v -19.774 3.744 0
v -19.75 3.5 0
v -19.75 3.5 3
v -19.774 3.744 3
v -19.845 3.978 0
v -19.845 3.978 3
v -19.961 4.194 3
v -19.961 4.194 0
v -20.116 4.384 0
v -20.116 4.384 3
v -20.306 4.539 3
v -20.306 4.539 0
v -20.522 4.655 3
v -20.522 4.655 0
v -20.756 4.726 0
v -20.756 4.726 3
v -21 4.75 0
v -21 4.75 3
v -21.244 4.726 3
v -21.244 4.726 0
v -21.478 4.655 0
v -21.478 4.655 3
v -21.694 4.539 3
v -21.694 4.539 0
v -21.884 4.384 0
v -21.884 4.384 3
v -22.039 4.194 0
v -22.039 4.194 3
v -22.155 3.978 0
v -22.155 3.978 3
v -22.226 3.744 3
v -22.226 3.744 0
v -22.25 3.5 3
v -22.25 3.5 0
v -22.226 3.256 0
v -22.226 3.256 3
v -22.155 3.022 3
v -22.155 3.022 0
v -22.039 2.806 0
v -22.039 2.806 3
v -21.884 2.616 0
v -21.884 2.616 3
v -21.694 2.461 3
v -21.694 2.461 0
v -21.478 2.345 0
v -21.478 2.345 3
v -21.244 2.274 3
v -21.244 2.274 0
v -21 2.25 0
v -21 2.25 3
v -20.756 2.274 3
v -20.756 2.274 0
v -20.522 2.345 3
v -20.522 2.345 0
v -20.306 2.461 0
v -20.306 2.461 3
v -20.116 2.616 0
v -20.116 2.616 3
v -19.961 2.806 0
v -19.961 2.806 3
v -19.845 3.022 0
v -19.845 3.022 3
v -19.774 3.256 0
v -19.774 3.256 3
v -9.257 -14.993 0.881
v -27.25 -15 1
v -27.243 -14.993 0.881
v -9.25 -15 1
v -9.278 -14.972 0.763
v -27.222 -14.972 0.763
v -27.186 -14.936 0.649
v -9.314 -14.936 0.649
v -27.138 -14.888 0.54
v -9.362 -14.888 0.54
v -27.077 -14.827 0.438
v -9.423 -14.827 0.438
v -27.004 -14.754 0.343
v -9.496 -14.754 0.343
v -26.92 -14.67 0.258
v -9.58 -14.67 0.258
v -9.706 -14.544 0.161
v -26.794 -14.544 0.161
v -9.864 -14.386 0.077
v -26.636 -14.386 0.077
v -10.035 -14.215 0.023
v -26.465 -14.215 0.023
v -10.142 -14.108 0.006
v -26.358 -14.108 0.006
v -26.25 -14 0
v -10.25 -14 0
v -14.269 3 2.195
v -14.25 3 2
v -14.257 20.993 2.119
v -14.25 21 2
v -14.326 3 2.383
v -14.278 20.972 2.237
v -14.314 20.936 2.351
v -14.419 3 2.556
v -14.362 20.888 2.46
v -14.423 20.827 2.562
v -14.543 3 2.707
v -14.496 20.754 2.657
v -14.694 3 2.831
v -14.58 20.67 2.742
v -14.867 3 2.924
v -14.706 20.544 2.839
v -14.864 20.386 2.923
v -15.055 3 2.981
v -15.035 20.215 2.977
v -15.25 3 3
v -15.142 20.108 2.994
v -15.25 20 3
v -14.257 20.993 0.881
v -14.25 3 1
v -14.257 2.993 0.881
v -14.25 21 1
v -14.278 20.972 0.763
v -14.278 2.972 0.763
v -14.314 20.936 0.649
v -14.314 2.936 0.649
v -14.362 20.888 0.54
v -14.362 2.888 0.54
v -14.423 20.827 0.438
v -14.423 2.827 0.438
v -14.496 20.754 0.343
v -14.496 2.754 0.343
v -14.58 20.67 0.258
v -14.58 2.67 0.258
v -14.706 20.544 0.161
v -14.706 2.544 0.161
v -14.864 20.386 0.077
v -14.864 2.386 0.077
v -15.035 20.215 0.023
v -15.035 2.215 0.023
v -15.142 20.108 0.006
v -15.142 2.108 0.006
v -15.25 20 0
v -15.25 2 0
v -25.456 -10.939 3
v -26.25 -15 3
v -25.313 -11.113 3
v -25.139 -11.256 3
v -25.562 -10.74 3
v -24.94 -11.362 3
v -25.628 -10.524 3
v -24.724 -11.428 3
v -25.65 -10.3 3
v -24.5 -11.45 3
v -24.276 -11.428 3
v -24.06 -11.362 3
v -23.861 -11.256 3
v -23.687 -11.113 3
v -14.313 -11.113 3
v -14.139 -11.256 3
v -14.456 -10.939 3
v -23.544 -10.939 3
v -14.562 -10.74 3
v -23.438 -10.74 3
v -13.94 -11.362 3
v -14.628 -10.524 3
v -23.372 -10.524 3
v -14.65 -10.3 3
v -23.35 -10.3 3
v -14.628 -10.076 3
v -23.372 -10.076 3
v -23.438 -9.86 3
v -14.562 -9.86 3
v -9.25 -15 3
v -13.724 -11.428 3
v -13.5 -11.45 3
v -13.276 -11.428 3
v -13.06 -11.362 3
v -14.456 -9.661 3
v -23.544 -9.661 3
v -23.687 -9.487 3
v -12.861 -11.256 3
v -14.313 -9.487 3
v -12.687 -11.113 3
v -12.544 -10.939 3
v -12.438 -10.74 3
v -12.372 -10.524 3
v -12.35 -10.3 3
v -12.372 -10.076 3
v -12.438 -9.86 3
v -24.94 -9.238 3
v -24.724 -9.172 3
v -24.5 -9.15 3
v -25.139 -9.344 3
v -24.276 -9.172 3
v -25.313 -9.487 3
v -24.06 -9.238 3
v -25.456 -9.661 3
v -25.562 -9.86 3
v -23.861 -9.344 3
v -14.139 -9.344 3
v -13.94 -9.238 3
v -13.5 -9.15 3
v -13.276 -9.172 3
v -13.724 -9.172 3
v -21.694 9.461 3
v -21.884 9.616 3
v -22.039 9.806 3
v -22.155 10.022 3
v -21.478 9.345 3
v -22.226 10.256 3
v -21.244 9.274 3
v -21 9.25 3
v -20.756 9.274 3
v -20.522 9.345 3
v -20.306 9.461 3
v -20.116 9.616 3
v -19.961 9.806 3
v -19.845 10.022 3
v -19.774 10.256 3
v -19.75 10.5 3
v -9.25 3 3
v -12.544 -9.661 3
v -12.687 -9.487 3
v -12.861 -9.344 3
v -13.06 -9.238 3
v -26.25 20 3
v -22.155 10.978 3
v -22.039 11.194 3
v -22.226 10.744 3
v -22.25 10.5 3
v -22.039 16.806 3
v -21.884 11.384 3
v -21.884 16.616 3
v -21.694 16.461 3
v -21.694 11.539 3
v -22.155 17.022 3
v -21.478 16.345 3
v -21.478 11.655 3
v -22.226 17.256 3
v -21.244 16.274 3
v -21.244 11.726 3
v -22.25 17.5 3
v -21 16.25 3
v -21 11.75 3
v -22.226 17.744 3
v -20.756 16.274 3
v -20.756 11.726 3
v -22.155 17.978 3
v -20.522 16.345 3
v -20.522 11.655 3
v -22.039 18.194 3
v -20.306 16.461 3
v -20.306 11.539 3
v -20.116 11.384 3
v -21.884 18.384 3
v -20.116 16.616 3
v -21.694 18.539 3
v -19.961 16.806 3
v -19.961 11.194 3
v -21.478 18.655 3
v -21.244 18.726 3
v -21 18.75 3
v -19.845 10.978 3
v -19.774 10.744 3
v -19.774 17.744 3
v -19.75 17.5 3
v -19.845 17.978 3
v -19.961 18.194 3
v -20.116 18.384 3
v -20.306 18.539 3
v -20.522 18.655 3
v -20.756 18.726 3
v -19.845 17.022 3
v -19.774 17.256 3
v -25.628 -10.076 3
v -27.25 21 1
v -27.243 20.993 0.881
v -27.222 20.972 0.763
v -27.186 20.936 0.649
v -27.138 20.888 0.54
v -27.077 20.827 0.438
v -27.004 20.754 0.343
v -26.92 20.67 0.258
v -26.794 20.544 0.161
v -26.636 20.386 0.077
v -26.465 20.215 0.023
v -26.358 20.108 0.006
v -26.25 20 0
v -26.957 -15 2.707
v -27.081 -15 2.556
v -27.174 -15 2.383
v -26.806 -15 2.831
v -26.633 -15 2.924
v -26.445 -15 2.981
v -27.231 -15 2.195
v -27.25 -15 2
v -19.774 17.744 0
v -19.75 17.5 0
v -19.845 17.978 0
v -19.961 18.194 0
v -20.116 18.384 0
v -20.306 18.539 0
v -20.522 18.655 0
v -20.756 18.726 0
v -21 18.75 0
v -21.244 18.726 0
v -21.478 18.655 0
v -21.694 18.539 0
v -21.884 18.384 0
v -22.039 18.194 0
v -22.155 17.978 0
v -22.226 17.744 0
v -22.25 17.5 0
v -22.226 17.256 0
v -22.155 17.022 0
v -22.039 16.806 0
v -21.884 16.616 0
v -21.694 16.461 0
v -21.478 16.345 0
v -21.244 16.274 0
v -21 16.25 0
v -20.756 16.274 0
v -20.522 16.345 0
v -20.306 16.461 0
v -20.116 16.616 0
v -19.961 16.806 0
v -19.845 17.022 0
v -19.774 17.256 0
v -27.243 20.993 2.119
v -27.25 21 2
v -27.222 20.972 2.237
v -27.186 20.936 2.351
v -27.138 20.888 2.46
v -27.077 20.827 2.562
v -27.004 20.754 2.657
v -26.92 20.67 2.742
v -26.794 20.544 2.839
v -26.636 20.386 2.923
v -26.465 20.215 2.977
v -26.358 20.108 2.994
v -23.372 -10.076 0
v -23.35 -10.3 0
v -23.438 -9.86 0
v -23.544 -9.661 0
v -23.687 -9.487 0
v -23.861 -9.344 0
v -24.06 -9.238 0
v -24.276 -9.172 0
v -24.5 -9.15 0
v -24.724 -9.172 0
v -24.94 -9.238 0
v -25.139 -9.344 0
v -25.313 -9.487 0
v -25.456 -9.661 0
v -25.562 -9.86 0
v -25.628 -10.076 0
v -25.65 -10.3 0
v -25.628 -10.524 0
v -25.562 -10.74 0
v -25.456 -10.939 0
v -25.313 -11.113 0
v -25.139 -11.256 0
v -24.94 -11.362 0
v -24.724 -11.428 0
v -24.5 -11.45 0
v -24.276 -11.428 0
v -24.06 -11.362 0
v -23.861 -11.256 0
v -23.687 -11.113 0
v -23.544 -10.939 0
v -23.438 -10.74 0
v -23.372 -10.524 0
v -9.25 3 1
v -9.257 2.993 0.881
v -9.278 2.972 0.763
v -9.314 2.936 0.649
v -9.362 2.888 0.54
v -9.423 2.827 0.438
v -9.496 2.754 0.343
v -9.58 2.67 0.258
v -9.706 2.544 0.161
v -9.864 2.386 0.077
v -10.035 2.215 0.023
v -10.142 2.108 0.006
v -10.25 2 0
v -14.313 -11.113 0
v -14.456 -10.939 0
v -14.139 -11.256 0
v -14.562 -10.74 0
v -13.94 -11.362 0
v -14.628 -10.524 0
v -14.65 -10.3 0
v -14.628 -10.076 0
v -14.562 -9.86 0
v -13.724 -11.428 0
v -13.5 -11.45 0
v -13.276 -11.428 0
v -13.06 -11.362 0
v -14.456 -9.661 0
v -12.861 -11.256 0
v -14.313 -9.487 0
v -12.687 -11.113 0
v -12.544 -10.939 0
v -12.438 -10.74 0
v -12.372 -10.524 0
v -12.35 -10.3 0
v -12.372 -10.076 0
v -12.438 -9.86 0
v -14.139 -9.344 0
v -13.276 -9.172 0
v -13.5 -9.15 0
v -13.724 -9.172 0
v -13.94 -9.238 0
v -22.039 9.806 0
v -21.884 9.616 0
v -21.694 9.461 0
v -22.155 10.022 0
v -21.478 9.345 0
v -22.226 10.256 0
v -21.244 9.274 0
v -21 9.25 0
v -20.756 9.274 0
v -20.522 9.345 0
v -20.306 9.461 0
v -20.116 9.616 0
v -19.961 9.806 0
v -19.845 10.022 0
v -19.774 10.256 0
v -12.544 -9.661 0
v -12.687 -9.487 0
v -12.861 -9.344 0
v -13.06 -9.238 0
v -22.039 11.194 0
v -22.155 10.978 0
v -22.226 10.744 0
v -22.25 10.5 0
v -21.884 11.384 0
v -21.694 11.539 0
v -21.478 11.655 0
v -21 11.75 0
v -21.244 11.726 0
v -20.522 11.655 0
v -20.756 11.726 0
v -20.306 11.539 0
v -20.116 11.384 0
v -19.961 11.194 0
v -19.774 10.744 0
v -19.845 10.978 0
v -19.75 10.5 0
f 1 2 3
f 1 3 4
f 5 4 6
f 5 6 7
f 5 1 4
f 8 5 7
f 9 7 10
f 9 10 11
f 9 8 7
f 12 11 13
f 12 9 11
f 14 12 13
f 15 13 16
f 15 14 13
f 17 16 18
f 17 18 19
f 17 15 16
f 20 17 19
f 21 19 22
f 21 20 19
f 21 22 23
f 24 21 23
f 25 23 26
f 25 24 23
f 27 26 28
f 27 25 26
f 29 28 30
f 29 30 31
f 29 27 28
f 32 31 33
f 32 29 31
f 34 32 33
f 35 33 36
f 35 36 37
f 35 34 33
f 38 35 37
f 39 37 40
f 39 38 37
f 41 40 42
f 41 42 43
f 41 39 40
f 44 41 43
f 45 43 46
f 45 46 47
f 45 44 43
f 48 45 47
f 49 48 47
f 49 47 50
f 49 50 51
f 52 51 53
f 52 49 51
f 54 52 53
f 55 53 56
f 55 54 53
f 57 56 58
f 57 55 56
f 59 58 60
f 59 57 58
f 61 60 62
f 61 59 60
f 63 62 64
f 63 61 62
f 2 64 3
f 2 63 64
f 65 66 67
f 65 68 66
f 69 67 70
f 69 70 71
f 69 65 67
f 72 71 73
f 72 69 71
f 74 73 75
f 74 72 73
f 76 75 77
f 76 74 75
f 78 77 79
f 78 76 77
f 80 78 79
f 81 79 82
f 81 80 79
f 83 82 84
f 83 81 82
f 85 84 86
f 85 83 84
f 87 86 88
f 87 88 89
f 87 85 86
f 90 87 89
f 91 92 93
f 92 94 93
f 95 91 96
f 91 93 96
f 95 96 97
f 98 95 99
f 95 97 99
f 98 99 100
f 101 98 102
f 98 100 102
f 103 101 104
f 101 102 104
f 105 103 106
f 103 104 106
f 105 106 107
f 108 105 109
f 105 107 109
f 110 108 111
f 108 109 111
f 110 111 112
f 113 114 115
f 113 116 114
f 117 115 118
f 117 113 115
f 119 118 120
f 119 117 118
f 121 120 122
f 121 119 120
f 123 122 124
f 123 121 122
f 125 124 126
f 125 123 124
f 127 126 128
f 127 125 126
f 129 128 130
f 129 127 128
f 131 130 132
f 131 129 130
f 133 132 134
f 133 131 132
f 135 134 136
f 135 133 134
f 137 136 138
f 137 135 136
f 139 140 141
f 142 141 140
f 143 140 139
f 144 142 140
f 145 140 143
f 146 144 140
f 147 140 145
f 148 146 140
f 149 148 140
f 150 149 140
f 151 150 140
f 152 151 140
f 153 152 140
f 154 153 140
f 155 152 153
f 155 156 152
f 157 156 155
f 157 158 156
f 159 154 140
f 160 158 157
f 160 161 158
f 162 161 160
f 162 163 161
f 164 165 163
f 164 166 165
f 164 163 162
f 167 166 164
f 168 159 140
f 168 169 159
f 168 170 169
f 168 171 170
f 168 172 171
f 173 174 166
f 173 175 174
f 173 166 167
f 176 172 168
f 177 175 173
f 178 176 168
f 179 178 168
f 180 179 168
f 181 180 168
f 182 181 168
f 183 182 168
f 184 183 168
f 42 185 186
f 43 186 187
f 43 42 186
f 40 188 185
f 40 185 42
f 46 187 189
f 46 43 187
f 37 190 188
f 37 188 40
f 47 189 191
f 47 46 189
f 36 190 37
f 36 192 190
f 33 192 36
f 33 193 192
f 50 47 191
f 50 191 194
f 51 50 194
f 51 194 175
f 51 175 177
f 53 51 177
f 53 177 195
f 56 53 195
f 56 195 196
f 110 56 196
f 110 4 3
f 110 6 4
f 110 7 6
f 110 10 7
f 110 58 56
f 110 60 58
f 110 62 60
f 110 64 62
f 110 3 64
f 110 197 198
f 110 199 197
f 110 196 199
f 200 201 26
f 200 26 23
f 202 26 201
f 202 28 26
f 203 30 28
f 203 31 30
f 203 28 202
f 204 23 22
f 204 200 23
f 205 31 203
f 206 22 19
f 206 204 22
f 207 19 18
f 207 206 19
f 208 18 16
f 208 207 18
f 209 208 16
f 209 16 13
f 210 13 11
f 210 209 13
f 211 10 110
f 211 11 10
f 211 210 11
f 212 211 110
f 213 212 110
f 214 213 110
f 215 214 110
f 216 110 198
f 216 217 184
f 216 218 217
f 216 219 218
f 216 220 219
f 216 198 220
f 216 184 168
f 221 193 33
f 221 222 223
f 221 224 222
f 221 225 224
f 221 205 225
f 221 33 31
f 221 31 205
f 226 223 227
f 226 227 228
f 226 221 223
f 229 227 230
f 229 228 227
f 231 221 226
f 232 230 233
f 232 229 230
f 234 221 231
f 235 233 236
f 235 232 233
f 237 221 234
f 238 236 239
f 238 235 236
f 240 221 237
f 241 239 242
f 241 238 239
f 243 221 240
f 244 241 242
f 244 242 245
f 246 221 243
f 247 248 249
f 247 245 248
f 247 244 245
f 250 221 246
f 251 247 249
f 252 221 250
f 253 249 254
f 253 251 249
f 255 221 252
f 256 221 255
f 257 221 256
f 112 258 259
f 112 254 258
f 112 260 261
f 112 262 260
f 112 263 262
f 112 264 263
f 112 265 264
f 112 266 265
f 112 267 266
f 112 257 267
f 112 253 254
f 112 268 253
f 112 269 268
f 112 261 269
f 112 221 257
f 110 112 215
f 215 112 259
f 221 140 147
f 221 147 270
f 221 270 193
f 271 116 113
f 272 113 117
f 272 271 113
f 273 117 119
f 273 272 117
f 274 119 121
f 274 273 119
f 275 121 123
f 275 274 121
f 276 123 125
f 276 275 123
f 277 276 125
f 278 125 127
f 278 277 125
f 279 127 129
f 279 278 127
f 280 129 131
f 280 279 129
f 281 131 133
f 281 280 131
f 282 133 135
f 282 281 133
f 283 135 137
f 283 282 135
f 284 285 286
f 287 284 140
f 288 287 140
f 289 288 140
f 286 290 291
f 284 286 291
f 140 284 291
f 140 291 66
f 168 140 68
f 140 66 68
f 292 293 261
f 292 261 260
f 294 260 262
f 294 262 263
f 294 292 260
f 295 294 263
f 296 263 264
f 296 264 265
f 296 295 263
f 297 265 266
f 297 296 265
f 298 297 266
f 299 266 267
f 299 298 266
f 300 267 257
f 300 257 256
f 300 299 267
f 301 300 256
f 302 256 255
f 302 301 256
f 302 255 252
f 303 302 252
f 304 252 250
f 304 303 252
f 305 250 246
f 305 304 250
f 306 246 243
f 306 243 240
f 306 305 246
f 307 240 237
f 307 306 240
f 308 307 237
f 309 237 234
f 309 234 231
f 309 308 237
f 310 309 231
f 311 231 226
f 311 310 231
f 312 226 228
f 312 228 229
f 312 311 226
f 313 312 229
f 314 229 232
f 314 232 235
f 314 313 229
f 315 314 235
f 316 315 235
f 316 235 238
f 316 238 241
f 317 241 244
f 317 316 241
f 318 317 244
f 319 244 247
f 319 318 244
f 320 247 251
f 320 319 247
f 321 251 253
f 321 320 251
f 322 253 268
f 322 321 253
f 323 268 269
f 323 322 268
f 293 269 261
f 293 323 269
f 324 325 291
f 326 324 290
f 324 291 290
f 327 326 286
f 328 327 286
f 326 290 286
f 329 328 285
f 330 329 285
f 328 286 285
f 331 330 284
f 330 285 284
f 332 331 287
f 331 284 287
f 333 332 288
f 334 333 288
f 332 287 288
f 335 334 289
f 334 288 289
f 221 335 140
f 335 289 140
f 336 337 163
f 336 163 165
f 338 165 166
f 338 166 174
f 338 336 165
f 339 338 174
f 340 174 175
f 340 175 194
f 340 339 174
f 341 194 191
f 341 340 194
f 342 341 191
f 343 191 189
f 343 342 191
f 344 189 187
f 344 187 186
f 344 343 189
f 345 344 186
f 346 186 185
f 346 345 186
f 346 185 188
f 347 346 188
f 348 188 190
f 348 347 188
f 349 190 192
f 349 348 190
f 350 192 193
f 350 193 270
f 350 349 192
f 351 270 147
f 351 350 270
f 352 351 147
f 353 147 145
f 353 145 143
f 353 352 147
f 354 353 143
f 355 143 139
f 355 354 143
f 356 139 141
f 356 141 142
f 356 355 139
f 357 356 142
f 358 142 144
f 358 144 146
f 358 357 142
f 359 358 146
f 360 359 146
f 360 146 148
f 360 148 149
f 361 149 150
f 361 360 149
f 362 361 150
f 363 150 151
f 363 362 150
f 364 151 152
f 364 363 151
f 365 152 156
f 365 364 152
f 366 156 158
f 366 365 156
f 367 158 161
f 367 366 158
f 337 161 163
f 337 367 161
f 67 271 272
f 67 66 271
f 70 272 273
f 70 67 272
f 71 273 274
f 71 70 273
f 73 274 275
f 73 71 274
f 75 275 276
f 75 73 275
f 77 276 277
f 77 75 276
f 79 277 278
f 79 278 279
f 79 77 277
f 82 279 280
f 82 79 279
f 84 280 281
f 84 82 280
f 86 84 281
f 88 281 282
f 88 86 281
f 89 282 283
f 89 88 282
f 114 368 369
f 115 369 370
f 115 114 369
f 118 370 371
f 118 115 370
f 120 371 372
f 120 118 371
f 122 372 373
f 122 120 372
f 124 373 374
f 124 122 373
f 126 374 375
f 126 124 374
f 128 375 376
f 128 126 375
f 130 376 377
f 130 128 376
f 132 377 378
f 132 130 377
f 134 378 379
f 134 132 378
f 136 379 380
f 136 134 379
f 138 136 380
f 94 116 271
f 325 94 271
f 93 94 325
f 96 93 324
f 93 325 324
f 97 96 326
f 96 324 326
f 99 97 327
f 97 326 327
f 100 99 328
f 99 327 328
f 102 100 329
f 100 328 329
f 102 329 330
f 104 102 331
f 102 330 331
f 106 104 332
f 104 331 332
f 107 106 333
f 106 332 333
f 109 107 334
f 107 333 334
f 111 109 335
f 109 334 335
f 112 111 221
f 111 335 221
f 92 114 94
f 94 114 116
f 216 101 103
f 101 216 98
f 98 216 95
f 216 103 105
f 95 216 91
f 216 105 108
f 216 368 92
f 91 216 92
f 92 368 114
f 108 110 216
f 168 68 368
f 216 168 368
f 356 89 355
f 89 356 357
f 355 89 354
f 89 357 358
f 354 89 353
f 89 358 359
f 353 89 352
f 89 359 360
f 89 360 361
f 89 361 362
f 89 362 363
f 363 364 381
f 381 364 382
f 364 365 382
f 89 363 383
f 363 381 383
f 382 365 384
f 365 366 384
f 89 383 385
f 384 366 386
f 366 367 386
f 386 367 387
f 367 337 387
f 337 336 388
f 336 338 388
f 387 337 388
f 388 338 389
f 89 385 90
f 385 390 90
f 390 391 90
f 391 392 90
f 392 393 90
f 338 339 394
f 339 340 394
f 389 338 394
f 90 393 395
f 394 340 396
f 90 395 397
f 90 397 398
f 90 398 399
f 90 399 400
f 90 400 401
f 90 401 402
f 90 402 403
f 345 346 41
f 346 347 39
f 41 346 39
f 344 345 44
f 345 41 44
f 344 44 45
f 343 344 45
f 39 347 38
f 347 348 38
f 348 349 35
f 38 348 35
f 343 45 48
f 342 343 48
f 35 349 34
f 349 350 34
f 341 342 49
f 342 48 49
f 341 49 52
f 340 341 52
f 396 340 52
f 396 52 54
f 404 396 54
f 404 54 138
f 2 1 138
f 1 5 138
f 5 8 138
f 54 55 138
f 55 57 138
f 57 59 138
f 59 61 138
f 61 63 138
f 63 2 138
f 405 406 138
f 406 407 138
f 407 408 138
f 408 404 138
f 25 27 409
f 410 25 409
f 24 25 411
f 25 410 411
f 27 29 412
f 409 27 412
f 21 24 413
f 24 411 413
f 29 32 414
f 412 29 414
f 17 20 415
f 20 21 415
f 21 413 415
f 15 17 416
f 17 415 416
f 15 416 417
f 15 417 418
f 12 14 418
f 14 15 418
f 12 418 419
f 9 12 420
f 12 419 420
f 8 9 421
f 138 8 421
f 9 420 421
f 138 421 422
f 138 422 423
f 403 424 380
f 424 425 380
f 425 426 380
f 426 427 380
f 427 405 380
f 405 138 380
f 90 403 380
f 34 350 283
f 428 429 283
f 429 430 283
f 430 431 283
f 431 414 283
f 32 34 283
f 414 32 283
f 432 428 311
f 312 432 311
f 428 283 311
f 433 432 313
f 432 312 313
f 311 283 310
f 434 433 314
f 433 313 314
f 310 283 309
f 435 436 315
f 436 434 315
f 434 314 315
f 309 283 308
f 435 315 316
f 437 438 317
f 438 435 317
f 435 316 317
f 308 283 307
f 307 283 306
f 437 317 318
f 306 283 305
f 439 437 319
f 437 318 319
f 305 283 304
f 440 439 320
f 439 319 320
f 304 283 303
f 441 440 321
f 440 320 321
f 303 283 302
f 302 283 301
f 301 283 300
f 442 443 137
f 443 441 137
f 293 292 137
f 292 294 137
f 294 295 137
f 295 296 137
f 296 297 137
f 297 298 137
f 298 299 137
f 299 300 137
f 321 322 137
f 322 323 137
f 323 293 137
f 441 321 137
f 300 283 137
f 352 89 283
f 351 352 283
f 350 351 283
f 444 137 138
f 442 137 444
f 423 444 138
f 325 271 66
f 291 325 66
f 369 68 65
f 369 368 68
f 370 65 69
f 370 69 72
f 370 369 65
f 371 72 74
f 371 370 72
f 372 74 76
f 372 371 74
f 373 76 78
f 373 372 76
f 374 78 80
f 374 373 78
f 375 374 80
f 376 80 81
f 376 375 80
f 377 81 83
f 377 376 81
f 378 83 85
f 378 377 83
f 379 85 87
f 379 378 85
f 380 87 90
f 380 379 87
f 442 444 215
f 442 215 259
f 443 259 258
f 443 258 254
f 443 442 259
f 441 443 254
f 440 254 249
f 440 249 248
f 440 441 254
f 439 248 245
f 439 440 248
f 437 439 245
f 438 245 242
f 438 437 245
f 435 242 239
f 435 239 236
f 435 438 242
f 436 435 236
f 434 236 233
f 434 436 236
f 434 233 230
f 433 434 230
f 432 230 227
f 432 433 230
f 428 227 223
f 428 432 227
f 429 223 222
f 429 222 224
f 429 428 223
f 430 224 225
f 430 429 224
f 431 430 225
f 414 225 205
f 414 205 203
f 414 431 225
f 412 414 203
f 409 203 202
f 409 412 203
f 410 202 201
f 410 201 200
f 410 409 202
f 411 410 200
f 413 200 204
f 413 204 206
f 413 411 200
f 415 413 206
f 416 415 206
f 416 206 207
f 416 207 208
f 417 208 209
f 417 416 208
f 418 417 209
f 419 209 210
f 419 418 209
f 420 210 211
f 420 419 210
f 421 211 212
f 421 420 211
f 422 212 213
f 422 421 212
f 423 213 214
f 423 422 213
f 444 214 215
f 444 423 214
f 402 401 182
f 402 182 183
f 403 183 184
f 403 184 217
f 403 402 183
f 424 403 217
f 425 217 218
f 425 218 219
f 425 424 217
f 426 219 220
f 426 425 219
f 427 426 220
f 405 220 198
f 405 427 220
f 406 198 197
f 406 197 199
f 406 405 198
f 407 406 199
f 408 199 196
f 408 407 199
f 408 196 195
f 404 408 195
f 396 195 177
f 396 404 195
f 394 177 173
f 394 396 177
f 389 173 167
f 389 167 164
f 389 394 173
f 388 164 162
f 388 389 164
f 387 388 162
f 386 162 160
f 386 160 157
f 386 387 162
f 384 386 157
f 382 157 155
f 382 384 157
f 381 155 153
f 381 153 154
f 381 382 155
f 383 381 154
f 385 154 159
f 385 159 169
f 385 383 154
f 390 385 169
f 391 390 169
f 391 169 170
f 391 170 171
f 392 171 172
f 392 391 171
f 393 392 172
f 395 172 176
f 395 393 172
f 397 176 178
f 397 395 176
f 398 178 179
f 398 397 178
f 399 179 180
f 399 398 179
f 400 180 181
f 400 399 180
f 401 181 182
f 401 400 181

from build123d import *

# Parameters (mm, degrees)
SKETCH1_R           = 1.25
SKETCH1_R_2         = 1.15
BOSS_EXTRUDE1_DEPTH = 3
FILLET2_R           = 1


with BuildPart() as part:
    # Sketch1 → Boss-Extrude1 (new body)
    with BuildSketch(Plane.XY):
        Polygon((-27.25, 21), (-27.25, 0), (-27.25, -15), (-9.25, -15), (-9.25, 3), (-14.25, 3), (-14.25, 21), align=None)
        with Locations((-21, 17.5)):
            Circle(SKETCH1_R, mode=Mode.SUBTRACT)
        with Locations((-21, 10.5)):
            Circle(SKETCH1_R, mode=Mode.SUBTRACT)
        with Locations((-21, 3.5)):
            Circle(SKETCH1_R, mode=Mode.SUBTRACT)
        with Locations((-13.5, -10.3)):
            Circle(SKETCH1_R_2, mode=Mode.SUBTRACT)
        with Locations((-24.5, -10.3)):
            Circle(SKETCH1_R_2, mode=Mode.SUBTRACT)
    extrude(amount=BOSS_EXTRUDE1_DEPTH)

    # Fillet2
    fillet2_edges = [part.edges().sort_by_distance(p)[0] for p in [
        (-20.75, 21, 0),
        (-14.25, 12, 3),
        (-20.75, 21, 3),
        (-14.25, 12, 0),
        (-11.75, 3, 0),
        (-9.25, -6, 0),
        (-18.25, -15, 0),
        (-27.25, 3, 3),
        (-27.25, 3, 0),
    ]]
    fillet(fillet2_edges, radius=FILLET2_R)


solid = part.part
